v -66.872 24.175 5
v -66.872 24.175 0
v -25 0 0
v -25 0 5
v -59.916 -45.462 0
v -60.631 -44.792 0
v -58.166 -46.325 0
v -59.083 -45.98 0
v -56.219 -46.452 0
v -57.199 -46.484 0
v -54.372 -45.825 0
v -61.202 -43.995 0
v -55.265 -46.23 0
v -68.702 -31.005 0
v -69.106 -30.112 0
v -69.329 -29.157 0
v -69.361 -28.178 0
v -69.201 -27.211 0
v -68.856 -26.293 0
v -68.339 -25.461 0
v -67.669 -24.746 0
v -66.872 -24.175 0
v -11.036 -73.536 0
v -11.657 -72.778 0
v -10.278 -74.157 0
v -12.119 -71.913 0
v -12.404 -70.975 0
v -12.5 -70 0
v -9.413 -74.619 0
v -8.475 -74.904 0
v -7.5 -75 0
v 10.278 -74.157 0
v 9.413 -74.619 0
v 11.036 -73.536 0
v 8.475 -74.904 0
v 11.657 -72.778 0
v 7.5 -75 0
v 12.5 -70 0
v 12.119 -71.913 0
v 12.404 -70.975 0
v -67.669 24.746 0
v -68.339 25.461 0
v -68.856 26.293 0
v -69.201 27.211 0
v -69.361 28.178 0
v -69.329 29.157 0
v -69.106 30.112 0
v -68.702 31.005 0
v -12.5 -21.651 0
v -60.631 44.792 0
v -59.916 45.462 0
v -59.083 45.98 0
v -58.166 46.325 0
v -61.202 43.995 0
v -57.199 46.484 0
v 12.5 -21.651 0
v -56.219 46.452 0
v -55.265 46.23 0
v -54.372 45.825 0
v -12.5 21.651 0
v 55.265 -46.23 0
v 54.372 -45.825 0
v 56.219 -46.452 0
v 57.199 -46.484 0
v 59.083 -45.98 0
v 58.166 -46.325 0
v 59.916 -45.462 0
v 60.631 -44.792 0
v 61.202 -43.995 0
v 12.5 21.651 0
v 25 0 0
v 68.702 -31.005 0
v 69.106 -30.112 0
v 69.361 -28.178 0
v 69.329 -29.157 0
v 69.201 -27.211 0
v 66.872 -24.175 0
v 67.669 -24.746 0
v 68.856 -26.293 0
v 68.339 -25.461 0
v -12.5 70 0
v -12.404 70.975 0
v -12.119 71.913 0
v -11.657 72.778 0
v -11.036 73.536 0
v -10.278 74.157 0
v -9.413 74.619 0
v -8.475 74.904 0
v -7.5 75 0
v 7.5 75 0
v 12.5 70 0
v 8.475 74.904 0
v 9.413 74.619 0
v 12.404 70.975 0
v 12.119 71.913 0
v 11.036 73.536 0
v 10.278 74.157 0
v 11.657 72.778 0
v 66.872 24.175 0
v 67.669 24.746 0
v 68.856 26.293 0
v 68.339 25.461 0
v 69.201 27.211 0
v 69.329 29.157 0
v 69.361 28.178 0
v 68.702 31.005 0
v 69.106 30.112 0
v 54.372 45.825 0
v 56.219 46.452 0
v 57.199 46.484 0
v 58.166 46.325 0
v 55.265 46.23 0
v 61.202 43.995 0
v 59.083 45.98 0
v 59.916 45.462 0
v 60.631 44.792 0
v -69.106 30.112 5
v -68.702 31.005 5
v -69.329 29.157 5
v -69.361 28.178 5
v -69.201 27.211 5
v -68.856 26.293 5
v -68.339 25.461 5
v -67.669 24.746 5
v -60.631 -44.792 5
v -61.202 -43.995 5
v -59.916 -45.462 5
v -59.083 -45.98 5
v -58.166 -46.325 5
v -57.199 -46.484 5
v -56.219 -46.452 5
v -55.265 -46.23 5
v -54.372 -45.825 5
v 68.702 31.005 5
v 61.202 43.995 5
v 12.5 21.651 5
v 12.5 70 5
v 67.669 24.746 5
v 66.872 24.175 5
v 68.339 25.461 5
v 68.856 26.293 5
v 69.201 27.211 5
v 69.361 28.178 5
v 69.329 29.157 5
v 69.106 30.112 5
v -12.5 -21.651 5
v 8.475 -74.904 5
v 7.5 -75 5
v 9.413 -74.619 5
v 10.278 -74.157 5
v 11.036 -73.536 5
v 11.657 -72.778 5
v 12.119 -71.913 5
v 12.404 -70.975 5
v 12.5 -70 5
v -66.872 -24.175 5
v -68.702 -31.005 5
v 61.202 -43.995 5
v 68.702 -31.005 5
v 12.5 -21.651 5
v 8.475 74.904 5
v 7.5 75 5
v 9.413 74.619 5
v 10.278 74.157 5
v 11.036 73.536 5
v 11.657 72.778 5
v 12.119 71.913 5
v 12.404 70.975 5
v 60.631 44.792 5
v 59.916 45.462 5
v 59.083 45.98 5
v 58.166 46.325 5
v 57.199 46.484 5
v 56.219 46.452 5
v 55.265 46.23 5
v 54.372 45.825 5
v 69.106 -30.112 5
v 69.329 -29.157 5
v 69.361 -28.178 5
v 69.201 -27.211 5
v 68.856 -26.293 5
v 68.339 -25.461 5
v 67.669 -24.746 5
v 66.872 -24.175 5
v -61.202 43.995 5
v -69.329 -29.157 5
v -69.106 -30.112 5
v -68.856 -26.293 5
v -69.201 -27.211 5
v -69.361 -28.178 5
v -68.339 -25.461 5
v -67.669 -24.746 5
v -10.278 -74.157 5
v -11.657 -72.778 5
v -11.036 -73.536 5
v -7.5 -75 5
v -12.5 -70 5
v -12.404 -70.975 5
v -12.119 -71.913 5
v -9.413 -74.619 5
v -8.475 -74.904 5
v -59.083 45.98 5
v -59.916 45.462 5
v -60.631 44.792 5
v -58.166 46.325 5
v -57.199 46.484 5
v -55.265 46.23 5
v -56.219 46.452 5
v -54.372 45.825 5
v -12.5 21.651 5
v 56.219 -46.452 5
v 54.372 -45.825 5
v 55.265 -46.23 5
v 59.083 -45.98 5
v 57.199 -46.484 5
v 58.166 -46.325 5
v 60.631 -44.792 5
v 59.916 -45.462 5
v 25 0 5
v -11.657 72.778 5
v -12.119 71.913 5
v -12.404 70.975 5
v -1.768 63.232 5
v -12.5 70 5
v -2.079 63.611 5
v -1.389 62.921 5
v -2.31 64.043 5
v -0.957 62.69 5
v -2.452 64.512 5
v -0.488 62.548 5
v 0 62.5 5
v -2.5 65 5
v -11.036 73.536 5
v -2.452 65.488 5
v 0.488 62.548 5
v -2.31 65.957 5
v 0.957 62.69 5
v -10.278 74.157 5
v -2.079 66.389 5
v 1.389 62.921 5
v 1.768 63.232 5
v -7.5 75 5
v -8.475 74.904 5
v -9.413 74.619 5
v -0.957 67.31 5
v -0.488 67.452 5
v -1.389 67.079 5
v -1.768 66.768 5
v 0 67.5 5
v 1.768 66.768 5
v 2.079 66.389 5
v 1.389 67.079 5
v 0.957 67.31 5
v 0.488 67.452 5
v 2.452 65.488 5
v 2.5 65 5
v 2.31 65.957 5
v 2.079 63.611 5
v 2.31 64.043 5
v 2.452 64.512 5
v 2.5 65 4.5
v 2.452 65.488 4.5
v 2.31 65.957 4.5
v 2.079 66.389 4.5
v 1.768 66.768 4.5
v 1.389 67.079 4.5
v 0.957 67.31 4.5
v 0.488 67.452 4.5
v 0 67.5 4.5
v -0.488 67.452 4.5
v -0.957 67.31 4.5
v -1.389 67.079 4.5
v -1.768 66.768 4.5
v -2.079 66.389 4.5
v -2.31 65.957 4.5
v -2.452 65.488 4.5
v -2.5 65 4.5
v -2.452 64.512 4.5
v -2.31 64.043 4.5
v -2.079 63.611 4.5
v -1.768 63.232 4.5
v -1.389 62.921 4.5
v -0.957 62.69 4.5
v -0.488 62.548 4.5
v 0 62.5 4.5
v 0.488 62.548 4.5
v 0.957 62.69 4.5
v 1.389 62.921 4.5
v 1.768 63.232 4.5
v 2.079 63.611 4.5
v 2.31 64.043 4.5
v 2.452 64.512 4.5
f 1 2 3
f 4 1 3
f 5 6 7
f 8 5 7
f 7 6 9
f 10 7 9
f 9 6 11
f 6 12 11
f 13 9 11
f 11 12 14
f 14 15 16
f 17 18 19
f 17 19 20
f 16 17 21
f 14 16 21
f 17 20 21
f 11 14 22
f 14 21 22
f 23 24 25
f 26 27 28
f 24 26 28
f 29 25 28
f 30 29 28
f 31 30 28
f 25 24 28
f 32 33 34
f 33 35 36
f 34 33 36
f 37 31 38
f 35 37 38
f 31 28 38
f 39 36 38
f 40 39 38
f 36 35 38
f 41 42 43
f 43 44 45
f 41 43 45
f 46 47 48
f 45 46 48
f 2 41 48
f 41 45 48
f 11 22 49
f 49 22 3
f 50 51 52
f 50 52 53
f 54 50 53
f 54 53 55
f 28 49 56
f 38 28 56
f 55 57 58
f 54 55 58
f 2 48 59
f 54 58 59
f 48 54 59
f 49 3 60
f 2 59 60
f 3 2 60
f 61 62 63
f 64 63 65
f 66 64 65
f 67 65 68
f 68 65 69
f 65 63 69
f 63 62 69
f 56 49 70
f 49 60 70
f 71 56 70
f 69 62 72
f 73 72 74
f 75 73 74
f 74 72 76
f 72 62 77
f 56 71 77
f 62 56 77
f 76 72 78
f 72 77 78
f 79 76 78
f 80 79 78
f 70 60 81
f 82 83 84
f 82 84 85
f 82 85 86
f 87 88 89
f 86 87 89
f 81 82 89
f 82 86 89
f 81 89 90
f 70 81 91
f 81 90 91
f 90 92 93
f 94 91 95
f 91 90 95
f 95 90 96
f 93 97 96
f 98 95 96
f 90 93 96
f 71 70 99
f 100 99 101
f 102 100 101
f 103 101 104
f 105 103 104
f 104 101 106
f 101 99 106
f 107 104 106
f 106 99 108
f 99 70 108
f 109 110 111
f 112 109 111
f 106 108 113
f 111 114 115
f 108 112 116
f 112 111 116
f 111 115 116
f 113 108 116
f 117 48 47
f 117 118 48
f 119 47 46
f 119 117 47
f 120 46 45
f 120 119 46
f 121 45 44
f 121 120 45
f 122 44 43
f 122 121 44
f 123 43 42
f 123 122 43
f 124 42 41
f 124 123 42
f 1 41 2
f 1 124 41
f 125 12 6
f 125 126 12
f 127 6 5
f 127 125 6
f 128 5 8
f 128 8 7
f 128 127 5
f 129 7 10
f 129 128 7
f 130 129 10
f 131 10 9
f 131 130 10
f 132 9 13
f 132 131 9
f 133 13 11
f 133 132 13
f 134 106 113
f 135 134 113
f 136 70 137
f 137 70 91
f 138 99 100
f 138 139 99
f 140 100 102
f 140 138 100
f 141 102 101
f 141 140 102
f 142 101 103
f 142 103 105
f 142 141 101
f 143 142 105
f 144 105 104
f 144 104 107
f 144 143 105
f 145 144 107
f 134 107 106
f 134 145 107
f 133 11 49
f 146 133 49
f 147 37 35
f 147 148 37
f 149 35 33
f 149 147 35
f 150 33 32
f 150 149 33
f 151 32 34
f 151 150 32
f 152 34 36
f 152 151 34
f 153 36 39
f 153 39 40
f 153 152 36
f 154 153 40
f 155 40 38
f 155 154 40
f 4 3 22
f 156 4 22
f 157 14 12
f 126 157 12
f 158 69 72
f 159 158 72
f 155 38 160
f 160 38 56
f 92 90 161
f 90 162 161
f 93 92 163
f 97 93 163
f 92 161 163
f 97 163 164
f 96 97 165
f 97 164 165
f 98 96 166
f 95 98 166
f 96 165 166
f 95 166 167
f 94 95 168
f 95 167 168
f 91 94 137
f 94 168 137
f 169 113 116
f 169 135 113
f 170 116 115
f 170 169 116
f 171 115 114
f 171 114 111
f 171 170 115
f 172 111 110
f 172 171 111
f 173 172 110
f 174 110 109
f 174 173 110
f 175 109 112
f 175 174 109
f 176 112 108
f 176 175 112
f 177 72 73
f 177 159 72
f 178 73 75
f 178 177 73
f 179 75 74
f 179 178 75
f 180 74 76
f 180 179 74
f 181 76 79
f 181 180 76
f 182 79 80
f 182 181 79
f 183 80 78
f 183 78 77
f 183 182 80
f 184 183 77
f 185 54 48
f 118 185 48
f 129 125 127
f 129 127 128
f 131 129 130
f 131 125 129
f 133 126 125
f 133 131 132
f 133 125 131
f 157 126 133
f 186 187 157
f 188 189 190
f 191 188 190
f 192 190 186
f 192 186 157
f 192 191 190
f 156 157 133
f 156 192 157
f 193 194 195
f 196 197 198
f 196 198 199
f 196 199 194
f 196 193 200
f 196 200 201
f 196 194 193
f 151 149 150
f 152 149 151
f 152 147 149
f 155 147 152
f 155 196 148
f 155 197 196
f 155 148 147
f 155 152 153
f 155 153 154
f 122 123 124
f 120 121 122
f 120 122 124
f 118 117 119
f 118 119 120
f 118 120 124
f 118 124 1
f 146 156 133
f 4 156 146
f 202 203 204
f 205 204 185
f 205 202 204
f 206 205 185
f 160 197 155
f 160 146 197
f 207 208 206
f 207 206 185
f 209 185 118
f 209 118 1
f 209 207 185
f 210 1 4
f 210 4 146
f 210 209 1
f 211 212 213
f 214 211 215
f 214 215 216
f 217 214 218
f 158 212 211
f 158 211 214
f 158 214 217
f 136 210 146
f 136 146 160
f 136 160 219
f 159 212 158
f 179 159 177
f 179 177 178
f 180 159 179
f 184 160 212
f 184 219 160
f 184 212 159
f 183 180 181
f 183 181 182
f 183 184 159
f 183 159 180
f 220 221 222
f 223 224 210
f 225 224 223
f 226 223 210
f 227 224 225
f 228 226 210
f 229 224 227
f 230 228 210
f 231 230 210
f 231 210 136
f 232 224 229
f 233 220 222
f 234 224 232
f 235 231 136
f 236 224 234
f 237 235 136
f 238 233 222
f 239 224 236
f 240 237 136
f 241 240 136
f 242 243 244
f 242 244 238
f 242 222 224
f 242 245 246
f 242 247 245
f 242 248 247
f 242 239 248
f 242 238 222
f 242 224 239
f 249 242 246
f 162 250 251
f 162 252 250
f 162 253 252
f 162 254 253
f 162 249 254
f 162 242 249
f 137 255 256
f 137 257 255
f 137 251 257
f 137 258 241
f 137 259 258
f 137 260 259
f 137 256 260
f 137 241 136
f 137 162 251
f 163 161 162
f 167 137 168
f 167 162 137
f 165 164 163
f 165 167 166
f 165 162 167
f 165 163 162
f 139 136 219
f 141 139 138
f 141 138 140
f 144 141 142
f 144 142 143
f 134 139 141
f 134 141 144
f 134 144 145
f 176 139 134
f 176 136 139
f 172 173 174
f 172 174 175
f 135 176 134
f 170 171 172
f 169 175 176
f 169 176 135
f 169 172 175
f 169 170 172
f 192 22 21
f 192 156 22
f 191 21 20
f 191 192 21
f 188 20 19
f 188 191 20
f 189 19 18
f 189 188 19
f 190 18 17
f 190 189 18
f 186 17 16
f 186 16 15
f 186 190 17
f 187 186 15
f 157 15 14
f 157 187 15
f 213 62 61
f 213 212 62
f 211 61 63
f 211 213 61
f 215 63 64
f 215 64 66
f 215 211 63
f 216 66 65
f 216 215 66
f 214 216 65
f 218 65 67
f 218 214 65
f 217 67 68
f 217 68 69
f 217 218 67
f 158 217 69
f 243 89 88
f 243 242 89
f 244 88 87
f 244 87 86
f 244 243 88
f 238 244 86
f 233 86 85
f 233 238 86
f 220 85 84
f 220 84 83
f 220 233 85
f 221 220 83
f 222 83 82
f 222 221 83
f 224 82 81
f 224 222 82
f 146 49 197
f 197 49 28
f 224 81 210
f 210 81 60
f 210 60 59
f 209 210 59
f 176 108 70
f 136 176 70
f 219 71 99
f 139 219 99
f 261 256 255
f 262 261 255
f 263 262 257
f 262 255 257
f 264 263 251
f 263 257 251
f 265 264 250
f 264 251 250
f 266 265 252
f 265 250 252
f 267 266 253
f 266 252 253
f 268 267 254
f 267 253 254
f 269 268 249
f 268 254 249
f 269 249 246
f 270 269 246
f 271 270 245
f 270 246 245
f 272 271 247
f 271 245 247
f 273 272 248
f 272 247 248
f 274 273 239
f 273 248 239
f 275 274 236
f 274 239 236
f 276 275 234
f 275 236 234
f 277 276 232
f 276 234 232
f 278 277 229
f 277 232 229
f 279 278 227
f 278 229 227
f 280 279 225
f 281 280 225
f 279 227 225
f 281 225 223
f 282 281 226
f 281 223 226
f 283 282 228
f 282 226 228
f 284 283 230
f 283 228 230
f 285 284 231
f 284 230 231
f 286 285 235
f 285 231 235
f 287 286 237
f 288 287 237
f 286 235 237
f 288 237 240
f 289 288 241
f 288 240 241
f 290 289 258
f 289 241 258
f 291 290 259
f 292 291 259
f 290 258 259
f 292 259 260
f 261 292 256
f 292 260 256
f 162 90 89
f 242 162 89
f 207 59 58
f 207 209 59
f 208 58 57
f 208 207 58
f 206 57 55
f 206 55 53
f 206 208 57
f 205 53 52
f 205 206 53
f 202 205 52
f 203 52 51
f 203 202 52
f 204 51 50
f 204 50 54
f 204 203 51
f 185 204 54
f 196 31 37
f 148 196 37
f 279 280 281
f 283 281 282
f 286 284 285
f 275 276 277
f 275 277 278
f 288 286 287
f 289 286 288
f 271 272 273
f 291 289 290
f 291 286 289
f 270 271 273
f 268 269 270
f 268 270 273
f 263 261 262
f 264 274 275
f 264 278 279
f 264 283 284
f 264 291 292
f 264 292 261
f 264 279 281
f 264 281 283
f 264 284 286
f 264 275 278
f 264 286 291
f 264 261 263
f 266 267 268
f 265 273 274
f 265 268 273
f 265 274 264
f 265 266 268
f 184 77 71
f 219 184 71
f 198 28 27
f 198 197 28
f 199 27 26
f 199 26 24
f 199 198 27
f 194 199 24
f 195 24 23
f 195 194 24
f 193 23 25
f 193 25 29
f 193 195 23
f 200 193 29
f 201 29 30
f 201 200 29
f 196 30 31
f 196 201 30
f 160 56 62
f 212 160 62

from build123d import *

# Parameters (mm, degrees)
F1_DEPTH = 5
F2_R     = 5
F3_R     = 2.5
F4_DEPTH = 0.5


with BuildPart() as f1:
    # F0 (on Top) → F1 (new body)
    with BuildSketch(Plane.XY):
        Polygon((12.5, 75), (-12.5, 75), (-12.5, 21.650635), (-58.701905, 48.325318), (-71.201905, 26.674682), (-25, 0), (-71.201905, -26.674682), (-58.701905, -48.325318), (-12.5, -21.650635), (-12.5, -75), (12.5, -75), (12.5, -21.650635), (58.701905, -48.325318), (71.201905, -26.674682), (25, 0), (71.201905, 26.674682), (58.701905, 48.325318), (12.5, 21.650635), align=None)
    extrude(amount=F1_DEPTH)

    # F2
    f2_edges = [f1.edges().sort_by_distance(p)[0] for p in [
        (-71.201905, -26.674682, 2.5),
        (-58.701905, -48.325318, 2.5),
        (-12.5, -75, 2.5),
        (12.5, -75, 2.5),
        (-71.201905, 26.674682, 2.5),
        (58.701905, -48.325318, 2.5),
        (71.201905, -26.674682, 2.5),
        (71.201905, 26.674682, 2.5),
        (58.701905, 48.325318, 2.5),
        (12.5, 75, 2.5),
        (-12.5, 75, 2.5),
        (-58.701905, 48.325318, 2.5),
    ]]
    fillet(f2_edges, radius=F2_R)

    # F3 (on face) → F4 (cut)
    with BuildSketch(Plane.XY.offset(5)):
        with Locations((0, 65)):
            Circle(F3_R)
    extrude(amount=-F4_DEPTH, mode=Mode.SUBTRACT)


solid = f1.part
